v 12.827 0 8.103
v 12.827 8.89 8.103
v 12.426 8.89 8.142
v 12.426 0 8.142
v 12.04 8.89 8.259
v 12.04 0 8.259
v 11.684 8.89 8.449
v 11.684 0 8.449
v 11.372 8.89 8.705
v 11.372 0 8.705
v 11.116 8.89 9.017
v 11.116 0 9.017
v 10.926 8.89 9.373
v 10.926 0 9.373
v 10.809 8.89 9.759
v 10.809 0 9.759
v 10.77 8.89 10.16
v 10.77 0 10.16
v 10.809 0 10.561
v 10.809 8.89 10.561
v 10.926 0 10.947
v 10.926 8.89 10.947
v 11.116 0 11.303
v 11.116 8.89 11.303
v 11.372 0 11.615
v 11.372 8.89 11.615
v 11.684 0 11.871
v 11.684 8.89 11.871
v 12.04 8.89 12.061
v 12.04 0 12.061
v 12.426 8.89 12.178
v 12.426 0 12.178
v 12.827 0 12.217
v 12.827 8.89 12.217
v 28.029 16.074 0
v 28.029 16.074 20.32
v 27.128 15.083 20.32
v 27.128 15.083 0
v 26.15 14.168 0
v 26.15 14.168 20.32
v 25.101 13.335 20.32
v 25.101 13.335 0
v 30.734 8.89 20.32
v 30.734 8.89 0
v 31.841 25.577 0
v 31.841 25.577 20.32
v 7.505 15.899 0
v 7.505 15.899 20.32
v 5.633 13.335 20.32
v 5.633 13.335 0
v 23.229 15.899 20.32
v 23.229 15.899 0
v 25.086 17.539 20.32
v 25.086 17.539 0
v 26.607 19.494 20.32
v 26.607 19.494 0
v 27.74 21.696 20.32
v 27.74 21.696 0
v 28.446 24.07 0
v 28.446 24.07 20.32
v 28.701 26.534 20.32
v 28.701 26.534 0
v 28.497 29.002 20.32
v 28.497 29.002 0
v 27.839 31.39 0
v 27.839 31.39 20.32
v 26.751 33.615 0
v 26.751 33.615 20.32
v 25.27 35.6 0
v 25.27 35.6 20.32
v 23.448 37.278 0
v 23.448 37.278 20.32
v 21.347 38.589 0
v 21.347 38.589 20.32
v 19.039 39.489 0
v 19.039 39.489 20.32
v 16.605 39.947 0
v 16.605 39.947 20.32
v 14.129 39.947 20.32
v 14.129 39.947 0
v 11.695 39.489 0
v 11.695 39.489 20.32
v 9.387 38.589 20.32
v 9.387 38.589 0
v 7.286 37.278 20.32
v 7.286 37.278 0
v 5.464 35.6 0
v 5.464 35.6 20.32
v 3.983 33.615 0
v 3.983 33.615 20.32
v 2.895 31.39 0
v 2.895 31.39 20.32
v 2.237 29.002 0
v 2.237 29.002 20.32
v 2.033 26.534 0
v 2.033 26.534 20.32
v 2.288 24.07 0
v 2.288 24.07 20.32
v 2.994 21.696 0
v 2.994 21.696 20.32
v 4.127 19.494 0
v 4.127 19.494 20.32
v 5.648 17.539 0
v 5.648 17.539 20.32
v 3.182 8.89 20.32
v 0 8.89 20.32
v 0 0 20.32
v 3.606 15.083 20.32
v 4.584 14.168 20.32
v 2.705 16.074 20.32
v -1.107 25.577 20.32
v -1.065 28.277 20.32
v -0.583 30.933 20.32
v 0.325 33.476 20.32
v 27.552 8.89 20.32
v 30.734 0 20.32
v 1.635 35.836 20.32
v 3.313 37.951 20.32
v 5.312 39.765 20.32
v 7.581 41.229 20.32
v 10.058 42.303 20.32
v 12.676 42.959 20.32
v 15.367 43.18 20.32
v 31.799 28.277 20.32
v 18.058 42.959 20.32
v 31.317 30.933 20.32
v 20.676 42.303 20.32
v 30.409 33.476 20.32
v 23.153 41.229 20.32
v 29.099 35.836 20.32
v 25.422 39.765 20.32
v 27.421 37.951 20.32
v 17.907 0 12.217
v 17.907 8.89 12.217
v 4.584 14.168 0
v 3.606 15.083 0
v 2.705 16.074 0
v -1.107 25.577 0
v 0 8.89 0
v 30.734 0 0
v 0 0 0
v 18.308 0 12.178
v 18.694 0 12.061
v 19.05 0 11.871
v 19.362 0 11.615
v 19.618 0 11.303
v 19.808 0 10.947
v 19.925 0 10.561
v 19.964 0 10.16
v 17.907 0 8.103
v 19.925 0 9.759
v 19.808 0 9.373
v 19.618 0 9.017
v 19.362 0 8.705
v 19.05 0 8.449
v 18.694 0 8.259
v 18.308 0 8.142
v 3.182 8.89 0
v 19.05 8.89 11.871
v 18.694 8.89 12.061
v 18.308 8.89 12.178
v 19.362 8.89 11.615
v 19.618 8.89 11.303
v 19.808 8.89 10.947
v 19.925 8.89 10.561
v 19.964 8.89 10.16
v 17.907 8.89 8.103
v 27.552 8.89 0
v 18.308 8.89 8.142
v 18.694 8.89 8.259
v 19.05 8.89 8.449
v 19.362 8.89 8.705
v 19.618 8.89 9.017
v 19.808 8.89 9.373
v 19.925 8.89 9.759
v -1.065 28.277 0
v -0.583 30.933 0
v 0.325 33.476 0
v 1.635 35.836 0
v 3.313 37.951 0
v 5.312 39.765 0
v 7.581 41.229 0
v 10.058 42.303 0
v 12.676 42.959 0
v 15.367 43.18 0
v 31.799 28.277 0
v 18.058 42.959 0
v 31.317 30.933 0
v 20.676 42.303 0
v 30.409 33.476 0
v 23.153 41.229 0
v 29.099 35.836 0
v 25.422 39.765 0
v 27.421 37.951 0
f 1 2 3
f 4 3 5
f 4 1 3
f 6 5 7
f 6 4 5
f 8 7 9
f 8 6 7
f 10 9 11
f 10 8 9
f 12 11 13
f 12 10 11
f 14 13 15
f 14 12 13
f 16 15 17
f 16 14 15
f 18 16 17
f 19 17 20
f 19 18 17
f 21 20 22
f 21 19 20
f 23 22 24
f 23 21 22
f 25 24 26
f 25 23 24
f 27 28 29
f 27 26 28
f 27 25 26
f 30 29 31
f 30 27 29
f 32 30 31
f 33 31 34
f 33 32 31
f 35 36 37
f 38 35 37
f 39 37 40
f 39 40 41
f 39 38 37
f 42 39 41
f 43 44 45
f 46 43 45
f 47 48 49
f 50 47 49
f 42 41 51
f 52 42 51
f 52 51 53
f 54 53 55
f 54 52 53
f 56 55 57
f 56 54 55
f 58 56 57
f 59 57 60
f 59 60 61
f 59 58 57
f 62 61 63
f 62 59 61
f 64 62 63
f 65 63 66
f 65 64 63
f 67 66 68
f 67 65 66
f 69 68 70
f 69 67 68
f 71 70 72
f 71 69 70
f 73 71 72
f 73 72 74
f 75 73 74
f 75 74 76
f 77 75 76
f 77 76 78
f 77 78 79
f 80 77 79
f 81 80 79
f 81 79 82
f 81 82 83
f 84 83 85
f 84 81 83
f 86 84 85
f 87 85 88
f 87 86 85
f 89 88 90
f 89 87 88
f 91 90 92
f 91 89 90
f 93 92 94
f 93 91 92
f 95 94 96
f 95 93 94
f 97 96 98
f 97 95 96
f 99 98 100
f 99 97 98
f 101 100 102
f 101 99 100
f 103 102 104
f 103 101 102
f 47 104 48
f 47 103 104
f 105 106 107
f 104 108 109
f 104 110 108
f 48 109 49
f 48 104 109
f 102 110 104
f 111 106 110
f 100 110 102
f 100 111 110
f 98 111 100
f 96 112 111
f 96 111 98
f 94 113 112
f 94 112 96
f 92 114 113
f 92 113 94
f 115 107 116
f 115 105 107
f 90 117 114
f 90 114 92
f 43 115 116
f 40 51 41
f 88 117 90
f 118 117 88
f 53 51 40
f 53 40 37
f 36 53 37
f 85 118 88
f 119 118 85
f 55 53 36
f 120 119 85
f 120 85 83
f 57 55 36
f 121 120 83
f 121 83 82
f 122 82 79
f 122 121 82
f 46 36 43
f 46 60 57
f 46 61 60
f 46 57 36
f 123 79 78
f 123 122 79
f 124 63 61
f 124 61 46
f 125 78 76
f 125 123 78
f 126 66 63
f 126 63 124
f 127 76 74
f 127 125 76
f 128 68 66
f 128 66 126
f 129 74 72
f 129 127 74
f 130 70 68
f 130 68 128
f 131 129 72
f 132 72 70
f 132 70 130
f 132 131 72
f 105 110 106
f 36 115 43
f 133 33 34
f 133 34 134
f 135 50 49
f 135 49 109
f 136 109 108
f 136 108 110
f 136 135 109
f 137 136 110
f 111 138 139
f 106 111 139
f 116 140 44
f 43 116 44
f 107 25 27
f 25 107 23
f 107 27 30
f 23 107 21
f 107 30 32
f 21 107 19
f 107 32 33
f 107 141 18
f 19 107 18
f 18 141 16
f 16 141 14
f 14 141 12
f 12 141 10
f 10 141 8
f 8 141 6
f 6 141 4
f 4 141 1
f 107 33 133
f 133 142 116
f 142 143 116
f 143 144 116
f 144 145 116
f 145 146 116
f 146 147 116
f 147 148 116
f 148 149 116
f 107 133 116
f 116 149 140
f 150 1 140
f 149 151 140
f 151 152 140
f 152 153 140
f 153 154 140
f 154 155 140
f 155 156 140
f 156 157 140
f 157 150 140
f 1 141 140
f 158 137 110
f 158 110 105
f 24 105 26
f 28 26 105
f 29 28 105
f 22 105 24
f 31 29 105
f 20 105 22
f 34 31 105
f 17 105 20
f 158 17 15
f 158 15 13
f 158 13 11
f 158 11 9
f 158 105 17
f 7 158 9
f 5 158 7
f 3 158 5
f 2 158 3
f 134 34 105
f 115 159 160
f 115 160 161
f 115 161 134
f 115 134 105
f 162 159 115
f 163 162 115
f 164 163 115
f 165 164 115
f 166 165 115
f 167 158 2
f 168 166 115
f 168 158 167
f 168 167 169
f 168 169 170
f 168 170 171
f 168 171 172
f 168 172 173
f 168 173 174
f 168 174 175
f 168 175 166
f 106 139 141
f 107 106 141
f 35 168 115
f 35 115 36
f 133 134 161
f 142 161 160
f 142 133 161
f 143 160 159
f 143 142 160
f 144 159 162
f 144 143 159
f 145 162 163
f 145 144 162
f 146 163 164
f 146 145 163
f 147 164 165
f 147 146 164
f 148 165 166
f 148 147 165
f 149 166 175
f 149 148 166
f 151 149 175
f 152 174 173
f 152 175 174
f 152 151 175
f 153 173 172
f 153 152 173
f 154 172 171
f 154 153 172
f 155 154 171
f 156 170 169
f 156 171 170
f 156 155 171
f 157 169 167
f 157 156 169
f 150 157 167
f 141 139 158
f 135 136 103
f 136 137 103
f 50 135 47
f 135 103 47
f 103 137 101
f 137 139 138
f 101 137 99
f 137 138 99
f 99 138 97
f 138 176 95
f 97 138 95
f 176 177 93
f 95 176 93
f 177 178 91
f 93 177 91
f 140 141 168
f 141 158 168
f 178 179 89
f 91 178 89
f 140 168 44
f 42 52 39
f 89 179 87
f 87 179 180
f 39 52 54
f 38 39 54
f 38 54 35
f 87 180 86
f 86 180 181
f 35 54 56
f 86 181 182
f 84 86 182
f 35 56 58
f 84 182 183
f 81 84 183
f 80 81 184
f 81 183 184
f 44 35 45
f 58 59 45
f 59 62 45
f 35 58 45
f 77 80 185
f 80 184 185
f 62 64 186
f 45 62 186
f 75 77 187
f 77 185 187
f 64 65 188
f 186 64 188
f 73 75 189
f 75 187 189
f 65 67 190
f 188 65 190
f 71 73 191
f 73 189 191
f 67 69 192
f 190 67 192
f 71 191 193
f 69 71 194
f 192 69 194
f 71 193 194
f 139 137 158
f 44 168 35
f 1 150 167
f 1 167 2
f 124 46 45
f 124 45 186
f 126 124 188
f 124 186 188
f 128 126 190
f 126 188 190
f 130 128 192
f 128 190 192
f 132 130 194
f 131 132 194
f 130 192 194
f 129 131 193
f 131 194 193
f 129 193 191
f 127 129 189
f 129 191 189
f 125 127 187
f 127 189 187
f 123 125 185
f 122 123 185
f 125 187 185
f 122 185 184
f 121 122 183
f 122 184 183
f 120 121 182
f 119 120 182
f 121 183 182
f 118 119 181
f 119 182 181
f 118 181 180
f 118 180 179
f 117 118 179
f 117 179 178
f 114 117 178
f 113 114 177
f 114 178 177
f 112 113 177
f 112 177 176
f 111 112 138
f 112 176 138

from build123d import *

# Parameters (mm, degrees)
BOSS_EXTRUDE1_DEPTH = 20.32
CUT_EXTRUDE1_REACH  = 59.39


with BuildPart() as part:
    # Sketch1 → Boss-Extrude1 (new body)
    with BuildSketch(Plane.XY):
        with BuildLine():
            Line((0, 0), (30.734, 0))
            Line((30.734, 0), (30.734, 8.89))
            Line((30.734, 8.89), (31.840804573, 25.577359666))
            ThreePointArc((31.840804573, 25.577359666), (15.367, 43.18), (-1.106804573, 25.577359666))
            Line((-1.106804573, 25.577359666), (0, 8.89))
            Line((0, 8.89), (0, 0))
        make_face()
        with BuildLine():
            Line((3.181975953, 8.89), (27.552024047, 8.89))
            Line((27.552024047, 8.89), (28.02853988, 16.074458114))
            ThreePointArc((28.02853988, 16.074458114), (26.648414098, 14.615548708), (25.10136567, 13.335))
            Line((25.10136567, 13.335), (23.229372272, 15.899423077))
            ThreePointArc((23.229372272, 15.899423077), (15.367, 40.005), (7.504627728, 15.899423077))
            Line((7.504627728, 15.899423077), (5.63263433, 13.335))
            ThreePointArc((5.63263433, 13.335), (4.085585902, 14.615548708), (2.70546012, 16.074458114))
            Line((2.70546012, 16.074458114), (3.181975953, 8.89))
        make_face(mode=Mode.SUBTRACT)
    extrude(amount=BOSS_EXTRUDE1_DEPTH)

    # Sketch2 → Cut-Extrude1 (cut, up to next)
    with BuildSketch(Plane.XZ, mode=Mode.PRIVATE) as cut_extrude1_sk1:
        with BuildLine():
            Line((12.827, 12.2174), (17.907, 12.2174))
            ThreePointArc((17.907, 12.2174), (19.9644, 10.16), (17.907, 8.1026))
            Line((17.907, 8.1026), (12.827, 8.1026))
            ThreePointArc((12.827, 8.1026), (10.7696, 10.16), (12.827, 12.2174))
        make_face()
    cut_extrude1_tool1 = extrude(cut_extrude1_sk1.sketch, amount=-CUT_EXTRUDE1_REACH, mode=Mode.PRIVATE) & part.part
    add(cut_extrude1_tool1.solids().sort_by_distance((15.367, 0, 10.16))[0], mode=Mode.SUBTRACT)


solid = part.part
